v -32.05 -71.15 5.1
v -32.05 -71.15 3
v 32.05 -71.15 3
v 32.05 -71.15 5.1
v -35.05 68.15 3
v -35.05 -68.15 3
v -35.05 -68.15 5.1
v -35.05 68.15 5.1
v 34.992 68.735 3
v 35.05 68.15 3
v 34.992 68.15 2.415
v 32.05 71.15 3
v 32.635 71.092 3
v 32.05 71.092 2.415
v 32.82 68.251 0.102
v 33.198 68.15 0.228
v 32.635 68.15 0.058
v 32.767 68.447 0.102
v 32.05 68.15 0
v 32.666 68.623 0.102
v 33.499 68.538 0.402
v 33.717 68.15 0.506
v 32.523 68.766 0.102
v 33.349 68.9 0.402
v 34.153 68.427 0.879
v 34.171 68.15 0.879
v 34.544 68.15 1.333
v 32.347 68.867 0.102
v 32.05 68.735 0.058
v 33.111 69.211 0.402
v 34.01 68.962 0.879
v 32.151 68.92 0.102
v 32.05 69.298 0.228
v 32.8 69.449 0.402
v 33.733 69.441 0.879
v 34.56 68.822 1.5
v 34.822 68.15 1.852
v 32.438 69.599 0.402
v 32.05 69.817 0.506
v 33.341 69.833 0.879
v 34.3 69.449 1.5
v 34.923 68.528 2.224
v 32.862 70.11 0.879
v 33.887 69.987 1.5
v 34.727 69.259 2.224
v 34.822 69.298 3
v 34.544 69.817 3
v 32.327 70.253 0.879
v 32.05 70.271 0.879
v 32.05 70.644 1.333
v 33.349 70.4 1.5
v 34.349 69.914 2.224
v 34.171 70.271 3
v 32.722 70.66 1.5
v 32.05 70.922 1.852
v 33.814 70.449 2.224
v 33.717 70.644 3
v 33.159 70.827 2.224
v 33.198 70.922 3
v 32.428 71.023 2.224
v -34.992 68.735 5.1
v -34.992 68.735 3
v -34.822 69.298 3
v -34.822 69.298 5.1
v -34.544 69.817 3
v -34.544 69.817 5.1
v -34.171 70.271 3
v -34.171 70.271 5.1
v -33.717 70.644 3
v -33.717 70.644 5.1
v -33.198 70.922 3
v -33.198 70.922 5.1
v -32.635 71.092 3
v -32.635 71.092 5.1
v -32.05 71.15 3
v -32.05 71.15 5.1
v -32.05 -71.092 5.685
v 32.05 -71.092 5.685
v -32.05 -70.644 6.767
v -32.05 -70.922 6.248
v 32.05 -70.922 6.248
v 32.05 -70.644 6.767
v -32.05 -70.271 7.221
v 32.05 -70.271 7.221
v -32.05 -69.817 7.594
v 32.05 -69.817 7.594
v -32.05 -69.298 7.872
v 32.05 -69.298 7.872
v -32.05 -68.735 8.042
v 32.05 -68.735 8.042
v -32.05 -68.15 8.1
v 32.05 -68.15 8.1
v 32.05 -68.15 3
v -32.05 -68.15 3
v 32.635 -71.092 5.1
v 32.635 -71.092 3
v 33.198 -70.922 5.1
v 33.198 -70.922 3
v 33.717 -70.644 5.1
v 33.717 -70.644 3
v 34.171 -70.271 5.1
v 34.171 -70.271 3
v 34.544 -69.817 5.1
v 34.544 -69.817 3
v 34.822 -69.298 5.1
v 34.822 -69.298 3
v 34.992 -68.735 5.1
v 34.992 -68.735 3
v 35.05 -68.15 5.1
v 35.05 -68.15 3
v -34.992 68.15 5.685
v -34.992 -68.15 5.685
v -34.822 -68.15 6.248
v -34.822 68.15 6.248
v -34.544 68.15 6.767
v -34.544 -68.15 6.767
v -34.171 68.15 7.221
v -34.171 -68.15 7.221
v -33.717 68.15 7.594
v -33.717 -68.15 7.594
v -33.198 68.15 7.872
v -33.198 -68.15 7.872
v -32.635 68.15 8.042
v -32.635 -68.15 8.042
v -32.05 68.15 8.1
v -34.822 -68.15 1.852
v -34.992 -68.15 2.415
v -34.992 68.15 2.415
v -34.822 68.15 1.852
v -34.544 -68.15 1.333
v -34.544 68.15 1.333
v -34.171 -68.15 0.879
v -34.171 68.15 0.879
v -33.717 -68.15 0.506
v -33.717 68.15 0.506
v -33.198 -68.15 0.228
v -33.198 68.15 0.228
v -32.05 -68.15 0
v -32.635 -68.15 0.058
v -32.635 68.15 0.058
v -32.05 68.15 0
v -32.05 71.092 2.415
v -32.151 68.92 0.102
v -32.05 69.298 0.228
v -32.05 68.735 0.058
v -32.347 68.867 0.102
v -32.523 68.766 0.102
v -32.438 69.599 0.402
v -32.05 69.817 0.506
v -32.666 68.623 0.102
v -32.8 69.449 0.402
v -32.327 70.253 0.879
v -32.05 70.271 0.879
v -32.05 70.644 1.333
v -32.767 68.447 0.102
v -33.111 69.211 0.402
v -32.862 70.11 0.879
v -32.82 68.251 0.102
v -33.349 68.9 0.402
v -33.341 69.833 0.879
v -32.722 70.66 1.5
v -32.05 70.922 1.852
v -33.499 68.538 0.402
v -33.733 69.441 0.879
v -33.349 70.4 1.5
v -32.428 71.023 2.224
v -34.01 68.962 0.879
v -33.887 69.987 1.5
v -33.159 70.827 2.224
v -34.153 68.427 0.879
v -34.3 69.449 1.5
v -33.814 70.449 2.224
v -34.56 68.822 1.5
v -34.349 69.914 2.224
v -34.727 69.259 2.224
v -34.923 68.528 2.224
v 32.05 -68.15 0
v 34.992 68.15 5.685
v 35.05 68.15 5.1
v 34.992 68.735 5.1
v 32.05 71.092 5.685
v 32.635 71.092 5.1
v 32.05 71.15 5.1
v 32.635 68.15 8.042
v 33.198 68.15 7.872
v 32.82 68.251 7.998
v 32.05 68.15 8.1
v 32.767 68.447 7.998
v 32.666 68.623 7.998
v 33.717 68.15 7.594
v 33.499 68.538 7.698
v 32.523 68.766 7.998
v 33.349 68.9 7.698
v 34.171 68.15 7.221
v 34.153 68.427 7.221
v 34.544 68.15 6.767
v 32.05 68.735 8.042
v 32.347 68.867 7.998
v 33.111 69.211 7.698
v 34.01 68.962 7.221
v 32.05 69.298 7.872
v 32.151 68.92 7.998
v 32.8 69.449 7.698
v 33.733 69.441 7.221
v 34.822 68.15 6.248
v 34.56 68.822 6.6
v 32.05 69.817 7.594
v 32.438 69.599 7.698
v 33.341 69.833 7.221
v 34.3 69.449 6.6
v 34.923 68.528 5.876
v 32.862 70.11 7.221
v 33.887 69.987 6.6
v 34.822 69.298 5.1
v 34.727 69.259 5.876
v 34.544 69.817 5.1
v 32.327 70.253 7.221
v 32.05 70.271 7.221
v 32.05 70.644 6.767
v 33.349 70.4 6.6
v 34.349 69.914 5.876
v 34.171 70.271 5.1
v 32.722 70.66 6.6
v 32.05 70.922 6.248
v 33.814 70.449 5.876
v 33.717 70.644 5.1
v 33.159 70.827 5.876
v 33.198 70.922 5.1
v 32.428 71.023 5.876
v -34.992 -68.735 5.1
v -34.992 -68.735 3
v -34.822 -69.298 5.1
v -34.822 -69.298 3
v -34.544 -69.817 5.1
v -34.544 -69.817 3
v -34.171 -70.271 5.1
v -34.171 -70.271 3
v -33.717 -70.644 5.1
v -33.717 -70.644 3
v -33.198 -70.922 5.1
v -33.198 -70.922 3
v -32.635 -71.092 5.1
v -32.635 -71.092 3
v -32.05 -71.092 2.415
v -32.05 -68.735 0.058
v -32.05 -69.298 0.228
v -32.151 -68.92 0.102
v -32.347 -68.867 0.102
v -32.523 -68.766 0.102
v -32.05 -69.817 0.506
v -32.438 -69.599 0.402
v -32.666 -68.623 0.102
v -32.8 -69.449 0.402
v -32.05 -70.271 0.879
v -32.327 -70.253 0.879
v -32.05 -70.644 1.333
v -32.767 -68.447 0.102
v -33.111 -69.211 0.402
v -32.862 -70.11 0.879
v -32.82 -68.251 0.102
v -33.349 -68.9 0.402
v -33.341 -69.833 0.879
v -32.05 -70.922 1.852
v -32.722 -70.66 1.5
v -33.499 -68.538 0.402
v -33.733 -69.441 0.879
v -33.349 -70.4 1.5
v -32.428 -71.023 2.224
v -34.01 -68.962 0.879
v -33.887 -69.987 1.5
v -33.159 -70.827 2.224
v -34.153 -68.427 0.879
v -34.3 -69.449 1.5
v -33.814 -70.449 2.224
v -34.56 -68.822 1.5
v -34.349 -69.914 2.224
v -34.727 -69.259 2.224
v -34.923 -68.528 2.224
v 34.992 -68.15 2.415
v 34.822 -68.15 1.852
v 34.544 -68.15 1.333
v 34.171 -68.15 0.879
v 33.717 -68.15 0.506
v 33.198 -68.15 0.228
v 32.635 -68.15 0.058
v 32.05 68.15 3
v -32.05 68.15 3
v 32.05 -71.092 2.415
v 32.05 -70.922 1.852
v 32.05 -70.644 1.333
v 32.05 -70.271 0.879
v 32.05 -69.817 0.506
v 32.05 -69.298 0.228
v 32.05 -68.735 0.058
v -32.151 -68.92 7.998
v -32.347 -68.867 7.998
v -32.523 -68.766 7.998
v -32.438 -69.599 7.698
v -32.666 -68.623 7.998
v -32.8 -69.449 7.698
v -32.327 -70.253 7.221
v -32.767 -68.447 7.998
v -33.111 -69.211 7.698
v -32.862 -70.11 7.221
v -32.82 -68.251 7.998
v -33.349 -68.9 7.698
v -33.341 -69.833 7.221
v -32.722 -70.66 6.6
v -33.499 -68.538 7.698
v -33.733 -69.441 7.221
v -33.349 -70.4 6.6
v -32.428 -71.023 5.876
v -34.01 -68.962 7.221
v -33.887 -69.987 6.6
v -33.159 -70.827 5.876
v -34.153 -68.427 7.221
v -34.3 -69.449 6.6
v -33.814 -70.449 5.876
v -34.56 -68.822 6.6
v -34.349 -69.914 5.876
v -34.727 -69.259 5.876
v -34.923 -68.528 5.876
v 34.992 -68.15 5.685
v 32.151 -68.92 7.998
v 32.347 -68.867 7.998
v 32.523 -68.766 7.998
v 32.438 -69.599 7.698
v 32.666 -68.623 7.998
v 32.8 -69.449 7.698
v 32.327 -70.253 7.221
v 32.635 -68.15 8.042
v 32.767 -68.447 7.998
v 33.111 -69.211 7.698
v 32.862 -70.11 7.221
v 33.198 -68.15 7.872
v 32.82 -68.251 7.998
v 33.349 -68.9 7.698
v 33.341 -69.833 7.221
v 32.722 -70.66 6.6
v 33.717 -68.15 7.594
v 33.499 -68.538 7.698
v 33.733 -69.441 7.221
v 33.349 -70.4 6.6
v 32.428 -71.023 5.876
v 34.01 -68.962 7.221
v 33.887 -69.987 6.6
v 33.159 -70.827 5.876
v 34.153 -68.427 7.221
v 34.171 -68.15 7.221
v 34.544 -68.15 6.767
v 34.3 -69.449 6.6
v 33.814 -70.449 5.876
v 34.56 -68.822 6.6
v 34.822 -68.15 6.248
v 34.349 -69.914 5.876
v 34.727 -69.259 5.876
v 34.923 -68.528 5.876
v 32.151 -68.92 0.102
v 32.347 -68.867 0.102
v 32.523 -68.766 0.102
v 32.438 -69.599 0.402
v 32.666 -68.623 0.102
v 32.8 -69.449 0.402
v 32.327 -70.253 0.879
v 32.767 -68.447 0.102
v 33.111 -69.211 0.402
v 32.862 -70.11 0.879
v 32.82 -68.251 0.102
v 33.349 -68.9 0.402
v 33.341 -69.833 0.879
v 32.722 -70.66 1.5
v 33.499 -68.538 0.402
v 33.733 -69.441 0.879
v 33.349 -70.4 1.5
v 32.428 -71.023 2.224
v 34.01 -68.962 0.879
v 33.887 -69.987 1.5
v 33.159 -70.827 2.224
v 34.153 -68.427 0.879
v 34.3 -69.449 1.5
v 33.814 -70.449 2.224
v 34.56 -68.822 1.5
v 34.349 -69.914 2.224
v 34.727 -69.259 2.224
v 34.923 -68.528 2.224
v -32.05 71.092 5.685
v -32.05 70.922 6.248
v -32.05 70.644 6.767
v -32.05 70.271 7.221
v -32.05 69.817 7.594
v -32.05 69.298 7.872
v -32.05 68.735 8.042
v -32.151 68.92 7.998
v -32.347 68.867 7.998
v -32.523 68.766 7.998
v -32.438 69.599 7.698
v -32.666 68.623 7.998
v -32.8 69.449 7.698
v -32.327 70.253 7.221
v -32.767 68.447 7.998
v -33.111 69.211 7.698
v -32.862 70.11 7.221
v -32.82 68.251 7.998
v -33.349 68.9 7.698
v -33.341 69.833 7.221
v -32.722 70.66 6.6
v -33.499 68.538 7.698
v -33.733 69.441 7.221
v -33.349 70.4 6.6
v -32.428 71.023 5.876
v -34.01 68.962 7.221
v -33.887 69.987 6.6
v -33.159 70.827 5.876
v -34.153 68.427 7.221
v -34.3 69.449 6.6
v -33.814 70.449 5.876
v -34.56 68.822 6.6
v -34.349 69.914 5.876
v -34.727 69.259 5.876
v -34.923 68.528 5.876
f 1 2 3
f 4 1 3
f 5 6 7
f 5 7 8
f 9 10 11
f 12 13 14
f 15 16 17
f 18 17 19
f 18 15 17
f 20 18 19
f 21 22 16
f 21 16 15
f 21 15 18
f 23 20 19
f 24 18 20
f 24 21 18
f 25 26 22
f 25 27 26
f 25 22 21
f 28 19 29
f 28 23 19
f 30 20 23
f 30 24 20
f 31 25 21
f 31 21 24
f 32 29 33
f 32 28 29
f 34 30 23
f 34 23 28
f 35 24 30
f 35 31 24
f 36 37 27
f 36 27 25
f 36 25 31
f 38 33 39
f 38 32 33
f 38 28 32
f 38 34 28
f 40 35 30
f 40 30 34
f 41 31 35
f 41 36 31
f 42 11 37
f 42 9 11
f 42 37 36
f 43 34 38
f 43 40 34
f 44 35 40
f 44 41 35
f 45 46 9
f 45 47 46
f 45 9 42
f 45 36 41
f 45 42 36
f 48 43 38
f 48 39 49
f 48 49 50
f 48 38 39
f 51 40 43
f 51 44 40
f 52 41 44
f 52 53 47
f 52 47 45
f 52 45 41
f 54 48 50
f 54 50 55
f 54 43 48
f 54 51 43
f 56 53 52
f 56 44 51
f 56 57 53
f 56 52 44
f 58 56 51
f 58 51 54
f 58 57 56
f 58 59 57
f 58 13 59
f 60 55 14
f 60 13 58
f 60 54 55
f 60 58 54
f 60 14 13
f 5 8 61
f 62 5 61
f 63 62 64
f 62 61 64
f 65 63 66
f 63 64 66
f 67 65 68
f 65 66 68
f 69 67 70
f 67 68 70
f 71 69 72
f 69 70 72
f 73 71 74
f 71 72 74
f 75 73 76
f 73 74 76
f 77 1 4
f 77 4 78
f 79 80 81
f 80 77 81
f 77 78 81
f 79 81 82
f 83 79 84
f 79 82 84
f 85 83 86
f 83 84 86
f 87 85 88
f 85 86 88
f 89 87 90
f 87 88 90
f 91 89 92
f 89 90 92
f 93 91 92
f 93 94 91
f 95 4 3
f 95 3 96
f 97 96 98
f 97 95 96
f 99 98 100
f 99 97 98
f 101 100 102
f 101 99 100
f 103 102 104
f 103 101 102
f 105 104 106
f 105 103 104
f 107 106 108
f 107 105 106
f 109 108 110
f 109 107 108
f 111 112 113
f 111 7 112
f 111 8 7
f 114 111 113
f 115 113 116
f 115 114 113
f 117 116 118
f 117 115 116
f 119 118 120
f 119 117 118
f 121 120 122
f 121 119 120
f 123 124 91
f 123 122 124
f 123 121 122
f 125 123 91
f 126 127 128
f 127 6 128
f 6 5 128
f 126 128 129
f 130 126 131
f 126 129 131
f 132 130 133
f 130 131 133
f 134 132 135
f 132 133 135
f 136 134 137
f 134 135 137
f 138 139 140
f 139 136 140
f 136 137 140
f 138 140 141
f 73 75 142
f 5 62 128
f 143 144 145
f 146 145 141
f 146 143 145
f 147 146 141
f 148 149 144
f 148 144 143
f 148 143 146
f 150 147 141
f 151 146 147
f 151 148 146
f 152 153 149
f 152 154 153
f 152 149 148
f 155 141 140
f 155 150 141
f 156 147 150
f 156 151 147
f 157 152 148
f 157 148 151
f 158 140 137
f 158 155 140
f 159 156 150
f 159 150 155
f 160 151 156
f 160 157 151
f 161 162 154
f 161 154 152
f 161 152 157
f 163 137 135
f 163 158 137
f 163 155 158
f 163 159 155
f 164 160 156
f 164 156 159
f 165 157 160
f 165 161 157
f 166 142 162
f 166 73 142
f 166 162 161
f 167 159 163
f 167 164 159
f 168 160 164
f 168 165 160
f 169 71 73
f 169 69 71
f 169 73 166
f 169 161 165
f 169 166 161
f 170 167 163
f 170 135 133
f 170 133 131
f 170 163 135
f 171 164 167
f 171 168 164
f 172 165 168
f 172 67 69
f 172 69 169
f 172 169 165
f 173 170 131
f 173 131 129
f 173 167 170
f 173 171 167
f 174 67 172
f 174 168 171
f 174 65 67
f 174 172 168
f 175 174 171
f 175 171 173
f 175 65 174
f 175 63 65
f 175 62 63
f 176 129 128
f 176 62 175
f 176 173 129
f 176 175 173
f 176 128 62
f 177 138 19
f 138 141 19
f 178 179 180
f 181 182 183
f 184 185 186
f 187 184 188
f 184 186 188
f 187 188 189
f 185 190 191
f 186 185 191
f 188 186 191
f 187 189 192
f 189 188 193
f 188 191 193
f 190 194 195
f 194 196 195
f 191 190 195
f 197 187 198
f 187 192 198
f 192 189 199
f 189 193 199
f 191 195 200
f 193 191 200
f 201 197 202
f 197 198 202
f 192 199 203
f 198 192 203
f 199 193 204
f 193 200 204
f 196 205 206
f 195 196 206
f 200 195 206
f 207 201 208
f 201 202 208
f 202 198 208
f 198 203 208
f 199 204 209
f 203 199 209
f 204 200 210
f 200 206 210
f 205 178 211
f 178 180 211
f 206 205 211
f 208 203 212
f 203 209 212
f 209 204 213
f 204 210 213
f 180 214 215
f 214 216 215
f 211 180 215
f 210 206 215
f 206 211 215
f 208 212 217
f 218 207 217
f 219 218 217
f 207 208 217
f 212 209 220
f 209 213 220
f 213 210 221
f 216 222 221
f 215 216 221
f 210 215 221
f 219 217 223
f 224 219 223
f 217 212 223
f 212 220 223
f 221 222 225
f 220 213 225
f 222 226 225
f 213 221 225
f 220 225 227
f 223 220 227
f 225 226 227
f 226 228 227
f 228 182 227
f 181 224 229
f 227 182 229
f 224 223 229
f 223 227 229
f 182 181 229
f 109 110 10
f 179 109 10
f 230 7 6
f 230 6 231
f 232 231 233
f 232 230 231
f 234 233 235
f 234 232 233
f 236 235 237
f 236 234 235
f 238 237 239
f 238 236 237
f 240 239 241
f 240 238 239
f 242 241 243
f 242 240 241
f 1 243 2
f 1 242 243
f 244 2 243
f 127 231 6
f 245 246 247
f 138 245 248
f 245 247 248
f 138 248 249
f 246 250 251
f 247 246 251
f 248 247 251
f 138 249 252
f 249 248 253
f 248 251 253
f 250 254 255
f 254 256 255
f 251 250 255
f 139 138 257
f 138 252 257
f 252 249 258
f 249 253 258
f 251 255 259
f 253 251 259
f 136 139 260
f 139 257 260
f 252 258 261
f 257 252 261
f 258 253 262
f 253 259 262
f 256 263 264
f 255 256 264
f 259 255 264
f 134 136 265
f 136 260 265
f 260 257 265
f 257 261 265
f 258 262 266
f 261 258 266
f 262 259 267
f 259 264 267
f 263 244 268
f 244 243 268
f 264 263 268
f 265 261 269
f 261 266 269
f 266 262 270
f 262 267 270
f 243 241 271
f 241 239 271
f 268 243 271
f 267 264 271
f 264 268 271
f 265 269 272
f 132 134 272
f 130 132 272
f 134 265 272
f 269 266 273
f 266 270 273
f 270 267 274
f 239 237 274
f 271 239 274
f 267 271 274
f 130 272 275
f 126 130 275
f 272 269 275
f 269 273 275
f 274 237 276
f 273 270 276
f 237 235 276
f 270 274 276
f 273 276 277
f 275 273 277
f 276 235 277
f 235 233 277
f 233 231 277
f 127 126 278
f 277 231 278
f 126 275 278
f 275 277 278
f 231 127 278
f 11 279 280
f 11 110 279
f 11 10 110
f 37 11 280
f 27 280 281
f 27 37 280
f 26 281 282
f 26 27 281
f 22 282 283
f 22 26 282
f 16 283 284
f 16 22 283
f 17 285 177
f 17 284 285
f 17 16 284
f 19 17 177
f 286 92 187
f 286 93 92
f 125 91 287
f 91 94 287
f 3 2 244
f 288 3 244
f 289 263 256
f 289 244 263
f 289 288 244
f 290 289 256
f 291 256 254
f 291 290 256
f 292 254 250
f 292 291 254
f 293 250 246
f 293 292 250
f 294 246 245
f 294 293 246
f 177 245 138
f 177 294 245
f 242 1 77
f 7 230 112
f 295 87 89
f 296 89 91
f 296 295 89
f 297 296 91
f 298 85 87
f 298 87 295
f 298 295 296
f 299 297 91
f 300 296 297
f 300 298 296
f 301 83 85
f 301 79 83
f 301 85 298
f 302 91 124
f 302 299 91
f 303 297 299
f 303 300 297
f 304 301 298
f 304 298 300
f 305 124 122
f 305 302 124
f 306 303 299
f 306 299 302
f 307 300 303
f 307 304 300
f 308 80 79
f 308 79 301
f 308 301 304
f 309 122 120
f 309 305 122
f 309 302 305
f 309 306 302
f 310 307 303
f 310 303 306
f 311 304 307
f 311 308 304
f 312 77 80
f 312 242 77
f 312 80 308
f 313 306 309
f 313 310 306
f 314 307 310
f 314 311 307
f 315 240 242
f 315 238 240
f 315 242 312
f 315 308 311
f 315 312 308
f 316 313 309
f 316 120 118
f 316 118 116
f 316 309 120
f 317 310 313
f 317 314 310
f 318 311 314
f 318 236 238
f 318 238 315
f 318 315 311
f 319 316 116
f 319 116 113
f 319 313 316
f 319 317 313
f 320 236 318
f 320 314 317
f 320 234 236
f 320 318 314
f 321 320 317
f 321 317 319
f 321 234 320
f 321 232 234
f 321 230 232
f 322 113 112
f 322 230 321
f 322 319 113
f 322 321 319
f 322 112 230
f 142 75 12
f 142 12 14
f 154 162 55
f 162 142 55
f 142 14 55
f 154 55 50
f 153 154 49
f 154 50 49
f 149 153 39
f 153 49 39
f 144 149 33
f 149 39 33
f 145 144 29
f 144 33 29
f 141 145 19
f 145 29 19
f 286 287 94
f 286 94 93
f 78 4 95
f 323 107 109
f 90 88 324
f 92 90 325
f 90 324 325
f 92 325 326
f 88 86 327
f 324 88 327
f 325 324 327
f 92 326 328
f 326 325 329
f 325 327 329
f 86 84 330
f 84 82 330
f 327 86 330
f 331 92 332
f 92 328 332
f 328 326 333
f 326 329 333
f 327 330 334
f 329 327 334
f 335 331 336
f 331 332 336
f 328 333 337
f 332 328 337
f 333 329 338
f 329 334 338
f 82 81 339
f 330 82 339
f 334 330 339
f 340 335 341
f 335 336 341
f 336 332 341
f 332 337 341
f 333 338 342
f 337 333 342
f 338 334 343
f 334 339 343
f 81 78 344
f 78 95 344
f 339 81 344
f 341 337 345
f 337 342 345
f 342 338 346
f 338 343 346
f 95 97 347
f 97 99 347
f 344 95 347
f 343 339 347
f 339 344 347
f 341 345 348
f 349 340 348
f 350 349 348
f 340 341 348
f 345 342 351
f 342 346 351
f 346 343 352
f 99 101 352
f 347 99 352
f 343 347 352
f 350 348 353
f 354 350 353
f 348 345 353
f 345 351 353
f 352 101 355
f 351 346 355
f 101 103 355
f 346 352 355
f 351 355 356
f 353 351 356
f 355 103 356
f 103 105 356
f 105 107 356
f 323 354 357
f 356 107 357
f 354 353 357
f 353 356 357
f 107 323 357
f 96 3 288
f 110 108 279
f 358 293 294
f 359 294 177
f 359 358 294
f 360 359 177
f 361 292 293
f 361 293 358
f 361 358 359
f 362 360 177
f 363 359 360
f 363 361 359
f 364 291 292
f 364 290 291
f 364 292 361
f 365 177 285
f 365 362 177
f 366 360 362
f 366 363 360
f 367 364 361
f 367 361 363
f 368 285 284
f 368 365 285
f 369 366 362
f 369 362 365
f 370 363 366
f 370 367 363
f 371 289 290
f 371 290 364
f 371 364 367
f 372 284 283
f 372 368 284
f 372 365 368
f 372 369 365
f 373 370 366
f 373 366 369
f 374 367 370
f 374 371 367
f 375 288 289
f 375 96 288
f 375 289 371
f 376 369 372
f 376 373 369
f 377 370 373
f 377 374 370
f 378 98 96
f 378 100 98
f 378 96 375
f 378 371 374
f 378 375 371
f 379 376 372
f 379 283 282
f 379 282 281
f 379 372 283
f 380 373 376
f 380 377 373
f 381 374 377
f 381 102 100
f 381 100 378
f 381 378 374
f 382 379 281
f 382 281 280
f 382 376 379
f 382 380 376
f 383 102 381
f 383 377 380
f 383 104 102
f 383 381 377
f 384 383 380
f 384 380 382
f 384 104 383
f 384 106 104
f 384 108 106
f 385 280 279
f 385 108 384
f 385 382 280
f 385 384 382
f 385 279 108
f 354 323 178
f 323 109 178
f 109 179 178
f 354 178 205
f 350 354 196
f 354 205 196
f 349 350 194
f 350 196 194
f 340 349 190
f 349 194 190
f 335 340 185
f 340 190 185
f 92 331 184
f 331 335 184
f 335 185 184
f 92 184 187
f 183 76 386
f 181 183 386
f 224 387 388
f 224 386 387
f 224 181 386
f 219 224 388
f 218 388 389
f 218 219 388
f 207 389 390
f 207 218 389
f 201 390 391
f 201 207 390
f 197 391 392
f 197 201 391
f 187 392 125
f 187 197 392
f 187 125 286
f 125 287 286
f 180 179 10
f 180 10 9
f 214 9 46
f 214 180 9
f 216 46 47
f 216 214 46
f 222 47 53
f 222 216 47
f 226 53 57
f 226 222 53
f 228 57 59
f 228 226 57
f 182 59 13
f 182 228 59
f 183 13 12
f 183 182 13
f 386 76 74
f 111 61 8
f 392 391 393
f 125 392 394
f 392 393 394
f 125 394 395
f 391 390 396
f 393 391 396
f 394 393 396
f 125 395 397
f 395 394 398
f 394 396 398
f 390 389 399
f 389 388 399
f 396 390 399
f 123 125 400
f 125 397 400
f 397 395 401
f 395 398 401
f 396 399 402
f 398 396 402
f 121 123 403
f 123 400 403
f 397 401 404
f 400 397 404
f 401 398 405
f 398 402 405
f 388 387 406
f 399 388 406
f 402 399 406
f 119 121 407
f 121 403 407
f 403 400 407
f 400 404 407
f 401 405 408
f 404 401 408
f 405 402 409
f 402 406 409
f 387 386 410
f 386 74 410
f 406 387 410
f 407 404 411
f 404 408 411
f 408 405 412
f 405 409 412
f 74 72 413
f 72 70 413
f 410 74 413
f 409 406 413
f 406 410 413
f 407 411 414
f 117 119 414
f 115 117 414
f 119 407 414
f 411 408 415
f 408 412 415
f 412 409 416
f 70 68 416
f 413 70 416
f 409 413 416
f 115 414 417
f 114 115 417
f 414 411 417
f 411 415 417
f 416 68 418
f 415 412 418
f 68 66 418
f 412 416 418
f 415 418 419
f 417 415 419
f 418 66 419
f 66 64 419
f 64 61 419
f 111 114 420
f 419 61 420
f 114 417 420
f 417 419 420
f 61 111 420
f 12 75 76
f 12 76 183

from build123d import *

# Parameters (mm, degrees)
F0_W     = 70.1
F0_H     = 142.3
F1_DEPTH = 8.1
F2_T     = -3
F3_R     = 2.99999


# Not quite as in the source:
# - a fillet or chamfer is up to 0.001 mm smaller than in the source, because OpenCascade refuses the exact size


with BuildPart() as f1:
    # F0 (on Top) → F1 (new body)
    with BuildSketch(Plane.XY):
        Rectangle(F0_W, F0_H)
    extrude(amount=F1_DEPTH)

    # F2
    f2_openings = [f1.faces().sort_by_distance(p)[0] for p in [
        (0, 0, 8.1),
    ]]
    offset(amount=F2_T, openings=f2_openings)

    # F3 (radius 3 in the source; OpenCascade refuses exactly that, so slightly less here)
    f3_edges = [f1.edges().sort_by_distance(p)[0] for p in [
        (-35.05, -71.15, 4.05),
        (35.05, -71.15, 4.05),
        (0, -71.15, 0),
        (0, -71.15, 8.1),
        (35.05, 71.15, 4.05),
        (35.05, 0, 0),
        (35.05, 0, 8.1),
        (-35.05, 71.15, 4.05),
        (0, 71.15, 0),
        (0, 71.15, 8.1),
        (-35.05, 0, 0),
        (-35.05, 0, 8.1),
    ]]
    fillet(f3_edges, radius=F3_R)


solid = f1.part
